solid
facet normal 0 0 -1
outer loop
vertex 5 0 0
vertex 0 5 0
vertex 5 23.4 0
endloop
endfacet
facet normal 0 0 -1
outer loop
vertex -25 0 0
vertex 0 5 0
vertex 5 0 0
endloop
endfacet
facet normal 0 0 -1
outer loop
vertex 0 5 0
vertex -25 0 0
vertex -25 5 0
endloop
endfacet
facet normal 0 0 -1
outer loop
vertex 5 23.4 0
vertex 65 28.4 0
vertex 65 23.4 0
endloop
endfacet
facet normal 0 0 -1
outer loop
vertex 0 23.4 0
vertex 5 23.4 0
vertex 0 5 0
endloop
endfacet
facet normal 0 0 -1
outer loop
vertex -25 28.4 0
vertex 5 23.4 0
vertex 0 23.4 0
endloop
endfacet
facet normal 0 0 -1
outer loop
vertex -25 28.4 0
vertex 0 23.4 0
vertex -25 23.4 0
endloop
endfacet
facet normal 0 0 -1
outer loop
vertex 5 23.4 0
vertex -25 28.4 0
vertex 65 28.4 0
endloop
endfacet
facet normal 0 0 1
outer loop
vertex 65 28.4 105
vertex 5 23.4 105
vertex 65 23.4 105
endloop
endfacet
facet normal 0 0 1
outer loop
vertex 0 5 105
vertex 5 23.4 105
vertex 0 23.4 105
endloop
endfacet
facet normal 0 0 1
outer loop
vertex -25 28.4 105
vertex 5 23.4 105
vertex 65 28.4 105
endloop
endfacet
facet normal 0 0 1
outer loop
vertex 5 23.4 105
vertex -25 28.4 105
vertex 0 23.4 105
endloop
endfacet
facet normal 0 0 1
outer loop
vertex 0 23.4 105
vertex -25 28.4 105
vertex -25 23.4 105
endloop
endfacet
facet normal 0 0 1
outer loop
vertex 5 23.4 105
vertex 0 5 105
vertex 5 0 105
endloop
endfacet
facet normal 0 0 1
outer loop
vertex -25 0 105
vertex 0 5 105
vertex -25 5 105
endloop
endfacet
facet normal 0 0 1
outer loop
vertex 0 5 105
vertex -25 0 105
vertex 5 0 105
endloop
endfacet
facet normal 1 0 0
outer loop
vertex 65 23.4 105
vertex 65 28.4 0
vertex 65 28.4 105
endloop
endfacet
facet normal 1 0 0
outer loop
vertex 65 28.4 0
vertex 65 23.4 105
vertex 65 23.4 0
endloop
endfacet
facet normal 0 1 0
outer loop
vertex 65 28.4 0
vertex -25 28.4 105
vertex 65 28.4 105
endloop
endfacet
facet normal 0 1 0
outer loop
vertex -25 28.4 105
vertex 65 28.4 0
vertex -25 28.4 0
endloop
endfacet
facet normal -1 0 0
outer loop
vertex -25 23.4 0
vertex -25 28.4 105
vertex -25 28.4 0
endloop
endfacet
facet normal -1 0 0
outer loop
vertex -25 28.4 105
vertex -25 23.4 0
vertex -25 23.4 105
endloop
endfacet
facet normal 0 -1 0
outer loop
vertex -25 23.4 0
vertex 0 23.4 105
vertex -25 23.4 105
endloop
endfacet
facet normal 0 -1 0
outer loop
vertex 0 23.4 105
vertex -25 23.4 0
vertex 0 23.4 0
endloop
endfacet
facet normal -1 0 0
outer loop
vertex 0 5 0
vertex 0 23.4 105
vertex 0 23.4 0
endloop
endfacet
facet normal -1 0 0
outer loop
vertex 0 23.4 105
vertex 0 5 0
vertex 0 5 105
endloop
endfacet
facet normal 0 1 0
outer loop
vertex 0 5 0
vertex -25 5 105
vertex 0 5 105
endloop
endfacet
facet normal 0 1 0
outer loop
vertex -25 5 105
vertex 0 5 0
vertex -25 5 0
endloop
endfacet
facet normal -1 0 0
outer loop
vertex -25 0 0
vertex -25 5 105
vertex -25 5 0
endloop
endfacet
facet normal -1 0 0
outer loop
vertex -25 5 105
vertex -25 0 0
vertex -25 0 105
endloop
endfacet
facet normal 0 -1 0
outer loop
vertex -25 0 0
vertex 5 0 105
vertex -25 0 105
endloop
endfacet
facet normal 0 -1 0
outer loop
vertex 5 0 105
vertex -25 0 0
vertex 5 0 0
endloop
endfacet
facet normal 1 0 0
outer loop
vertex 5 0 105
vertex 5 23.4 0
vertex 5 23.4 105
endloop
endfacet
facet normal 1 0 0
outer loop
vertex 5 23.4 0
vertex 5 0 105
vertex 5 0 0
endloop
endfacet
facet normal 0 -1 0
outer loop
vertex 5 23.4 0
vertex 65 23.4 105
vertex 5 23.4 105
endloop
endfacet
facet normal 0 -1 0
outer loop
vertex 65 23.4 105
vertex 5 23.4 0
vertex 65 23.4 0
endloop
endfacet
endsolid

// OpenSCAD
// --- Dimensions ---
shelf_thickness = 18.0;      // Thickness of the shelf (mm)
clamp_gap = 18.4;            // Gap width for the shelf (mm)
spine_width = 5.0;           // Width of the vertical spine (mm)
spine_depth = 28.4;          // Depth of the spine (mm)
bottom_jaw_width = 25.0;     // Width of the bottom jaw (mm)
bottom_jaw_depth = 5.0;       // Depth of the bottom jaw (mm)
top_jaw_width = 90.0;        // Total width of the top jaw/arm (mm)
top_jaw_depth = 5.0;         // Depth of the top jaw (mm)
arm_length = 65.0;           // Length of the arm extending forward (mm)
total_height = 105.0;        // Total extrusion length (Z-axis in print)

hole_diameter = 20.0;        // Diameter of pipette holes (mm)
hole_x_offset = 42.0;        // X-coordinate of hole centers
hole_z_start = 17.5;         // First hole Z-coordinate
hole_z_end = 87.5;           // Last hole Z-coordinate
hole_z_step = 35.0;          // Increment between holes (52.5 - 17.5)

$fn = 64;

// --- Modeling ---
// The user specified:
// 1. Profile is in XY plane.
// 2. Extruded 105mm along Z.
// 3. Print orientation: Lying on its side (XY plane is the profile).
// 4. Holes: "go through the arm along Y (vertically in use)".
//    In the print orientation (Z is extrusion), "vertically in use" is the Y axis.
//    Therefore, the holes are cylinders oriented along the Y axis.

// Correcting the profile geometry based on the user's coordinate description:
// Spine: x [0, 5], y [0, 28.4]
// Bottom jaw: x [-25, 5], y [0, 5]
// Top jaw/arm: x [-25, 65], y [23.4, 28.4]
// Note: The previous version had the top jaw starting at y=5, which was incorrect.
// The gap is between y=5 and y=23.4 (which is 18.4mm).

module profile_2d() {
    union() {
        // Spine: x [0, 5], y [0, 28.4]
        square([spine_width, spine_depth]);
        
        // Bottom jaw: x [-25, 5], y [0, 5]
        translate([-bottom_jaw_width, 0])
            square([bottom_jaw_width + spine_width, bottom_jaw_depth]);
        
        // Top jaw and arm: x [-25, 65], y [23.4, 28.4]
        // The arm extends to x = 65. The total width is 65 - (-25) = 90.
        translate([-bottom_jaw_width, 23.4])
            square([bottom_jaw_width + arm_length, top_jaw_depth]);
    }
}

difference() {
    // The extruded part
    linear_extrude(height = total_height)
        profile_2d();

    // The holes: oriented along Y (the vertical axis in use).
    // They are centered at x = 42 and z = 17.5, 52.5, 87.5.
    // To ensure they cut through the arm (which is at y = 23.4 to 28.4),
    // we must extend the cylinder along the Y axis.
    for (z_pos = [hole_z_start, hole_z_start + hole_z_step, hole_z_end]) {
        translate([hole_x_offset, -1, z_pos])
            rotate([0, 90, 0])
                cylinder(d = hole_diameter, h = spine_depth + 2);
    }
}
